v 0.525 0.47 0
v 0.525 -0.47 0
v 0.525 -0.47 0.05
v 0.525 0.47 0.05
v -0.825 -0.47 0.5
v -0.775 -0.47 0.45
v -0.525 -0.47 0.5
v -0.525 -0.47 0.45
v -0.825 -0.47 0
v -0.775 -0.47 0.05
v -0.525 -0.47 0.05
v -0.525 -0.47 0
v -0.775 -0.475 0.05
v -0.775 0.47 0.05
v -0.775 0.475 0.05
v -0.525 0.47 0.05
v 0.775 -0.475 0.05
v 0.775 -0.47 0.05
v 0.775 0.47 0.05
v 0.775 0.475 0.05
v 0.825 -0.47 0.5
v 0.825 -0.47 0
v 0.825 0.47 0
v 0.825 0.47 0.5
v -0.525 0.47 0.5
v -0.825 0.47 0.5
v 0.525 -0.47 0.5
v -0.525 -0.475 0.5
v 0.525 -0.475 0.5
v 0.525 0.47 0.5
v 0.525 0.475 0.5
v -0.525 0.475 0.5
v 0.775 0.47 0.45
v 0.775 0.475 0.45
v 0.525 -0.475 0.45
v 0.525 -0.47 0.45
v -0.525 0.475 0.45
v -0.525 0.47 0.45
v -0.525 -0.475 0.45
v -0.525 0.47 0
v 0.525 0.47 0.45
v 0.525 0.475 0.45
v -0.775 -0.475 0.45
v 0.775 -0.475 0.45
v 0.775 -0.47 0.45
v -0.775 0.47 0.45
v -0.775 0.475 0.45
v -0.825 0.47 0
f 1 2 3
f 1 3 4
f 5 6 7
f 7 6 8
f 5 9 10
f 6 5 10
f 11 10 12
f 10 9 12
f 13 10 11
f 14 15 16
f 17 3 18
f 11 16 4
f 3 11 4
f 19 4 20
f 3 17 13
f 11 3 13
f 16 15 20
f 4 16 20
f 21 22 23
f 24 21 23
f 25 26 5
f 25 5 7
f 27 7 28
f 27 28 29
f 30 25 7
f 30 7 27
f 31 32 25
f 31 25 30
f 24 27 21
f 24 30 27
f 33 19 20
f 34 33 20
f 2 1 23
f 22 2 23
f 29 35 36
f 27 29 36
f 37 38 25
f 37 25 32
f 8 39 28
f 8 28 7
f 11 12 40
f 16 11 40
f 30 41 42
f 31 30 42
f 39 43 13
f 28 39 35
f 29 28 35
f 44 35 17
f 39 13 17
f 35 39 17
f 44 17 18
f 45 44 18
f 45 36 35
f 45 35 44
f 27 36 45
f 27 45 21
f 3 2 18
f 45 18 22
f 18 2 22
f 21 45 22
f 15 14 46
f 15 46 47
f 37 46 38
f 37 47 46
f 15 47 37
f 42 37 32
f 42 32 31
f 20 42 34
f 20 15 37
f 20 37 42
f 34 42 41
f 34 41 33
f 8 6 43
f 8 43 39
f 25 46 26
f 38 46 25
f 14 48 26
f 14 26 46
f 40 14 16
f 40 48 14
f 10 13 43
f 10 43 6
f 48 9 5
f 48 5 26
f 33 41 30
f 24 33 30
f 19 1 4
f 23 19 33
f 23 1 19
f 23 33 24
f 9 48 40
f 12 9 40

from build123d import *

# Parameters (mm, degrees)
PLATING_LEFT_W      = 0.3
PLATING_LEFT_H      = 0.94
PLATING_LEFT_DEPTH  = 0.5
PLATING_RIGHT_W     = 0.3
PLATING_RIGHT_H     = 0.94
PLATING_RIGHT_DEPTH = 0.5
MARKING_W           = 1.05
MARKING_H           = 0.95
MARKING_DEPTH       = 0.05
CHIP_W              = 1.55
CHIP_H              = 0.95
CHIP_DEPTH          = 0.4


with BuildPart() as plating_left:
    # plating_left → plating_left (new body)
    with BuildSketch(Plane(origin=(-0.825, -0.47, 0), x_dir=(1, 0, 0), z_dir=(0, 0, 1))):
        with Locations((0.15, 0.47)):
            Rectangle(PLATING_LEFT_W, PLATING_LEFT_H)
    extrude(amount=PLATING_LEFT_DEPTH)


with BuildPart() as plating_right:
    # plating_right → plating_right (new body)
    with BuildSketch(Plane(origin=(0.525, -0.47, 0), x_dir=(1, 0, 0), z_dir=(0, 0, 1))):
        with Locations((0.15, 0.47)):
            Rectangle(PLATING_RIGHT_W, PLATING_RIGHT_H)
    extrude(amount=PLATING_RIGHT_DEPTH)


with BuildPart() as marking:
    # marking → marking (new body)
    with BuildSketch(Plane(origin=(-0.525, -0.475, 0.45), x_dir=(1, 0, 0), z_dir=(0, 0, 1))):
        with Locations((0.525, 0.475)):
            Rectangle(MARKING_W, MARKING_H)
    extrude(amount=MARKING_DEPTH)


with BuildPart() as resistor:
    # chip → chip (new body)
    with BuildSketch(Plane(origin=(-0.775, -0.475, 0.05), x_dir=(1, 0, 0), z_dir=(0, 0, 1))):
        with Locations((0.775, 0.475)):
            Rectangle(CHIP_W, CHIP_H)
    extrude(amount=CHIP_DEPTH)

    # resistor: union plating_left, plating_right, marking
    add(plating_left.part)
    add(plating_right.part)
    add(marking.part)


solid = resistor.part
